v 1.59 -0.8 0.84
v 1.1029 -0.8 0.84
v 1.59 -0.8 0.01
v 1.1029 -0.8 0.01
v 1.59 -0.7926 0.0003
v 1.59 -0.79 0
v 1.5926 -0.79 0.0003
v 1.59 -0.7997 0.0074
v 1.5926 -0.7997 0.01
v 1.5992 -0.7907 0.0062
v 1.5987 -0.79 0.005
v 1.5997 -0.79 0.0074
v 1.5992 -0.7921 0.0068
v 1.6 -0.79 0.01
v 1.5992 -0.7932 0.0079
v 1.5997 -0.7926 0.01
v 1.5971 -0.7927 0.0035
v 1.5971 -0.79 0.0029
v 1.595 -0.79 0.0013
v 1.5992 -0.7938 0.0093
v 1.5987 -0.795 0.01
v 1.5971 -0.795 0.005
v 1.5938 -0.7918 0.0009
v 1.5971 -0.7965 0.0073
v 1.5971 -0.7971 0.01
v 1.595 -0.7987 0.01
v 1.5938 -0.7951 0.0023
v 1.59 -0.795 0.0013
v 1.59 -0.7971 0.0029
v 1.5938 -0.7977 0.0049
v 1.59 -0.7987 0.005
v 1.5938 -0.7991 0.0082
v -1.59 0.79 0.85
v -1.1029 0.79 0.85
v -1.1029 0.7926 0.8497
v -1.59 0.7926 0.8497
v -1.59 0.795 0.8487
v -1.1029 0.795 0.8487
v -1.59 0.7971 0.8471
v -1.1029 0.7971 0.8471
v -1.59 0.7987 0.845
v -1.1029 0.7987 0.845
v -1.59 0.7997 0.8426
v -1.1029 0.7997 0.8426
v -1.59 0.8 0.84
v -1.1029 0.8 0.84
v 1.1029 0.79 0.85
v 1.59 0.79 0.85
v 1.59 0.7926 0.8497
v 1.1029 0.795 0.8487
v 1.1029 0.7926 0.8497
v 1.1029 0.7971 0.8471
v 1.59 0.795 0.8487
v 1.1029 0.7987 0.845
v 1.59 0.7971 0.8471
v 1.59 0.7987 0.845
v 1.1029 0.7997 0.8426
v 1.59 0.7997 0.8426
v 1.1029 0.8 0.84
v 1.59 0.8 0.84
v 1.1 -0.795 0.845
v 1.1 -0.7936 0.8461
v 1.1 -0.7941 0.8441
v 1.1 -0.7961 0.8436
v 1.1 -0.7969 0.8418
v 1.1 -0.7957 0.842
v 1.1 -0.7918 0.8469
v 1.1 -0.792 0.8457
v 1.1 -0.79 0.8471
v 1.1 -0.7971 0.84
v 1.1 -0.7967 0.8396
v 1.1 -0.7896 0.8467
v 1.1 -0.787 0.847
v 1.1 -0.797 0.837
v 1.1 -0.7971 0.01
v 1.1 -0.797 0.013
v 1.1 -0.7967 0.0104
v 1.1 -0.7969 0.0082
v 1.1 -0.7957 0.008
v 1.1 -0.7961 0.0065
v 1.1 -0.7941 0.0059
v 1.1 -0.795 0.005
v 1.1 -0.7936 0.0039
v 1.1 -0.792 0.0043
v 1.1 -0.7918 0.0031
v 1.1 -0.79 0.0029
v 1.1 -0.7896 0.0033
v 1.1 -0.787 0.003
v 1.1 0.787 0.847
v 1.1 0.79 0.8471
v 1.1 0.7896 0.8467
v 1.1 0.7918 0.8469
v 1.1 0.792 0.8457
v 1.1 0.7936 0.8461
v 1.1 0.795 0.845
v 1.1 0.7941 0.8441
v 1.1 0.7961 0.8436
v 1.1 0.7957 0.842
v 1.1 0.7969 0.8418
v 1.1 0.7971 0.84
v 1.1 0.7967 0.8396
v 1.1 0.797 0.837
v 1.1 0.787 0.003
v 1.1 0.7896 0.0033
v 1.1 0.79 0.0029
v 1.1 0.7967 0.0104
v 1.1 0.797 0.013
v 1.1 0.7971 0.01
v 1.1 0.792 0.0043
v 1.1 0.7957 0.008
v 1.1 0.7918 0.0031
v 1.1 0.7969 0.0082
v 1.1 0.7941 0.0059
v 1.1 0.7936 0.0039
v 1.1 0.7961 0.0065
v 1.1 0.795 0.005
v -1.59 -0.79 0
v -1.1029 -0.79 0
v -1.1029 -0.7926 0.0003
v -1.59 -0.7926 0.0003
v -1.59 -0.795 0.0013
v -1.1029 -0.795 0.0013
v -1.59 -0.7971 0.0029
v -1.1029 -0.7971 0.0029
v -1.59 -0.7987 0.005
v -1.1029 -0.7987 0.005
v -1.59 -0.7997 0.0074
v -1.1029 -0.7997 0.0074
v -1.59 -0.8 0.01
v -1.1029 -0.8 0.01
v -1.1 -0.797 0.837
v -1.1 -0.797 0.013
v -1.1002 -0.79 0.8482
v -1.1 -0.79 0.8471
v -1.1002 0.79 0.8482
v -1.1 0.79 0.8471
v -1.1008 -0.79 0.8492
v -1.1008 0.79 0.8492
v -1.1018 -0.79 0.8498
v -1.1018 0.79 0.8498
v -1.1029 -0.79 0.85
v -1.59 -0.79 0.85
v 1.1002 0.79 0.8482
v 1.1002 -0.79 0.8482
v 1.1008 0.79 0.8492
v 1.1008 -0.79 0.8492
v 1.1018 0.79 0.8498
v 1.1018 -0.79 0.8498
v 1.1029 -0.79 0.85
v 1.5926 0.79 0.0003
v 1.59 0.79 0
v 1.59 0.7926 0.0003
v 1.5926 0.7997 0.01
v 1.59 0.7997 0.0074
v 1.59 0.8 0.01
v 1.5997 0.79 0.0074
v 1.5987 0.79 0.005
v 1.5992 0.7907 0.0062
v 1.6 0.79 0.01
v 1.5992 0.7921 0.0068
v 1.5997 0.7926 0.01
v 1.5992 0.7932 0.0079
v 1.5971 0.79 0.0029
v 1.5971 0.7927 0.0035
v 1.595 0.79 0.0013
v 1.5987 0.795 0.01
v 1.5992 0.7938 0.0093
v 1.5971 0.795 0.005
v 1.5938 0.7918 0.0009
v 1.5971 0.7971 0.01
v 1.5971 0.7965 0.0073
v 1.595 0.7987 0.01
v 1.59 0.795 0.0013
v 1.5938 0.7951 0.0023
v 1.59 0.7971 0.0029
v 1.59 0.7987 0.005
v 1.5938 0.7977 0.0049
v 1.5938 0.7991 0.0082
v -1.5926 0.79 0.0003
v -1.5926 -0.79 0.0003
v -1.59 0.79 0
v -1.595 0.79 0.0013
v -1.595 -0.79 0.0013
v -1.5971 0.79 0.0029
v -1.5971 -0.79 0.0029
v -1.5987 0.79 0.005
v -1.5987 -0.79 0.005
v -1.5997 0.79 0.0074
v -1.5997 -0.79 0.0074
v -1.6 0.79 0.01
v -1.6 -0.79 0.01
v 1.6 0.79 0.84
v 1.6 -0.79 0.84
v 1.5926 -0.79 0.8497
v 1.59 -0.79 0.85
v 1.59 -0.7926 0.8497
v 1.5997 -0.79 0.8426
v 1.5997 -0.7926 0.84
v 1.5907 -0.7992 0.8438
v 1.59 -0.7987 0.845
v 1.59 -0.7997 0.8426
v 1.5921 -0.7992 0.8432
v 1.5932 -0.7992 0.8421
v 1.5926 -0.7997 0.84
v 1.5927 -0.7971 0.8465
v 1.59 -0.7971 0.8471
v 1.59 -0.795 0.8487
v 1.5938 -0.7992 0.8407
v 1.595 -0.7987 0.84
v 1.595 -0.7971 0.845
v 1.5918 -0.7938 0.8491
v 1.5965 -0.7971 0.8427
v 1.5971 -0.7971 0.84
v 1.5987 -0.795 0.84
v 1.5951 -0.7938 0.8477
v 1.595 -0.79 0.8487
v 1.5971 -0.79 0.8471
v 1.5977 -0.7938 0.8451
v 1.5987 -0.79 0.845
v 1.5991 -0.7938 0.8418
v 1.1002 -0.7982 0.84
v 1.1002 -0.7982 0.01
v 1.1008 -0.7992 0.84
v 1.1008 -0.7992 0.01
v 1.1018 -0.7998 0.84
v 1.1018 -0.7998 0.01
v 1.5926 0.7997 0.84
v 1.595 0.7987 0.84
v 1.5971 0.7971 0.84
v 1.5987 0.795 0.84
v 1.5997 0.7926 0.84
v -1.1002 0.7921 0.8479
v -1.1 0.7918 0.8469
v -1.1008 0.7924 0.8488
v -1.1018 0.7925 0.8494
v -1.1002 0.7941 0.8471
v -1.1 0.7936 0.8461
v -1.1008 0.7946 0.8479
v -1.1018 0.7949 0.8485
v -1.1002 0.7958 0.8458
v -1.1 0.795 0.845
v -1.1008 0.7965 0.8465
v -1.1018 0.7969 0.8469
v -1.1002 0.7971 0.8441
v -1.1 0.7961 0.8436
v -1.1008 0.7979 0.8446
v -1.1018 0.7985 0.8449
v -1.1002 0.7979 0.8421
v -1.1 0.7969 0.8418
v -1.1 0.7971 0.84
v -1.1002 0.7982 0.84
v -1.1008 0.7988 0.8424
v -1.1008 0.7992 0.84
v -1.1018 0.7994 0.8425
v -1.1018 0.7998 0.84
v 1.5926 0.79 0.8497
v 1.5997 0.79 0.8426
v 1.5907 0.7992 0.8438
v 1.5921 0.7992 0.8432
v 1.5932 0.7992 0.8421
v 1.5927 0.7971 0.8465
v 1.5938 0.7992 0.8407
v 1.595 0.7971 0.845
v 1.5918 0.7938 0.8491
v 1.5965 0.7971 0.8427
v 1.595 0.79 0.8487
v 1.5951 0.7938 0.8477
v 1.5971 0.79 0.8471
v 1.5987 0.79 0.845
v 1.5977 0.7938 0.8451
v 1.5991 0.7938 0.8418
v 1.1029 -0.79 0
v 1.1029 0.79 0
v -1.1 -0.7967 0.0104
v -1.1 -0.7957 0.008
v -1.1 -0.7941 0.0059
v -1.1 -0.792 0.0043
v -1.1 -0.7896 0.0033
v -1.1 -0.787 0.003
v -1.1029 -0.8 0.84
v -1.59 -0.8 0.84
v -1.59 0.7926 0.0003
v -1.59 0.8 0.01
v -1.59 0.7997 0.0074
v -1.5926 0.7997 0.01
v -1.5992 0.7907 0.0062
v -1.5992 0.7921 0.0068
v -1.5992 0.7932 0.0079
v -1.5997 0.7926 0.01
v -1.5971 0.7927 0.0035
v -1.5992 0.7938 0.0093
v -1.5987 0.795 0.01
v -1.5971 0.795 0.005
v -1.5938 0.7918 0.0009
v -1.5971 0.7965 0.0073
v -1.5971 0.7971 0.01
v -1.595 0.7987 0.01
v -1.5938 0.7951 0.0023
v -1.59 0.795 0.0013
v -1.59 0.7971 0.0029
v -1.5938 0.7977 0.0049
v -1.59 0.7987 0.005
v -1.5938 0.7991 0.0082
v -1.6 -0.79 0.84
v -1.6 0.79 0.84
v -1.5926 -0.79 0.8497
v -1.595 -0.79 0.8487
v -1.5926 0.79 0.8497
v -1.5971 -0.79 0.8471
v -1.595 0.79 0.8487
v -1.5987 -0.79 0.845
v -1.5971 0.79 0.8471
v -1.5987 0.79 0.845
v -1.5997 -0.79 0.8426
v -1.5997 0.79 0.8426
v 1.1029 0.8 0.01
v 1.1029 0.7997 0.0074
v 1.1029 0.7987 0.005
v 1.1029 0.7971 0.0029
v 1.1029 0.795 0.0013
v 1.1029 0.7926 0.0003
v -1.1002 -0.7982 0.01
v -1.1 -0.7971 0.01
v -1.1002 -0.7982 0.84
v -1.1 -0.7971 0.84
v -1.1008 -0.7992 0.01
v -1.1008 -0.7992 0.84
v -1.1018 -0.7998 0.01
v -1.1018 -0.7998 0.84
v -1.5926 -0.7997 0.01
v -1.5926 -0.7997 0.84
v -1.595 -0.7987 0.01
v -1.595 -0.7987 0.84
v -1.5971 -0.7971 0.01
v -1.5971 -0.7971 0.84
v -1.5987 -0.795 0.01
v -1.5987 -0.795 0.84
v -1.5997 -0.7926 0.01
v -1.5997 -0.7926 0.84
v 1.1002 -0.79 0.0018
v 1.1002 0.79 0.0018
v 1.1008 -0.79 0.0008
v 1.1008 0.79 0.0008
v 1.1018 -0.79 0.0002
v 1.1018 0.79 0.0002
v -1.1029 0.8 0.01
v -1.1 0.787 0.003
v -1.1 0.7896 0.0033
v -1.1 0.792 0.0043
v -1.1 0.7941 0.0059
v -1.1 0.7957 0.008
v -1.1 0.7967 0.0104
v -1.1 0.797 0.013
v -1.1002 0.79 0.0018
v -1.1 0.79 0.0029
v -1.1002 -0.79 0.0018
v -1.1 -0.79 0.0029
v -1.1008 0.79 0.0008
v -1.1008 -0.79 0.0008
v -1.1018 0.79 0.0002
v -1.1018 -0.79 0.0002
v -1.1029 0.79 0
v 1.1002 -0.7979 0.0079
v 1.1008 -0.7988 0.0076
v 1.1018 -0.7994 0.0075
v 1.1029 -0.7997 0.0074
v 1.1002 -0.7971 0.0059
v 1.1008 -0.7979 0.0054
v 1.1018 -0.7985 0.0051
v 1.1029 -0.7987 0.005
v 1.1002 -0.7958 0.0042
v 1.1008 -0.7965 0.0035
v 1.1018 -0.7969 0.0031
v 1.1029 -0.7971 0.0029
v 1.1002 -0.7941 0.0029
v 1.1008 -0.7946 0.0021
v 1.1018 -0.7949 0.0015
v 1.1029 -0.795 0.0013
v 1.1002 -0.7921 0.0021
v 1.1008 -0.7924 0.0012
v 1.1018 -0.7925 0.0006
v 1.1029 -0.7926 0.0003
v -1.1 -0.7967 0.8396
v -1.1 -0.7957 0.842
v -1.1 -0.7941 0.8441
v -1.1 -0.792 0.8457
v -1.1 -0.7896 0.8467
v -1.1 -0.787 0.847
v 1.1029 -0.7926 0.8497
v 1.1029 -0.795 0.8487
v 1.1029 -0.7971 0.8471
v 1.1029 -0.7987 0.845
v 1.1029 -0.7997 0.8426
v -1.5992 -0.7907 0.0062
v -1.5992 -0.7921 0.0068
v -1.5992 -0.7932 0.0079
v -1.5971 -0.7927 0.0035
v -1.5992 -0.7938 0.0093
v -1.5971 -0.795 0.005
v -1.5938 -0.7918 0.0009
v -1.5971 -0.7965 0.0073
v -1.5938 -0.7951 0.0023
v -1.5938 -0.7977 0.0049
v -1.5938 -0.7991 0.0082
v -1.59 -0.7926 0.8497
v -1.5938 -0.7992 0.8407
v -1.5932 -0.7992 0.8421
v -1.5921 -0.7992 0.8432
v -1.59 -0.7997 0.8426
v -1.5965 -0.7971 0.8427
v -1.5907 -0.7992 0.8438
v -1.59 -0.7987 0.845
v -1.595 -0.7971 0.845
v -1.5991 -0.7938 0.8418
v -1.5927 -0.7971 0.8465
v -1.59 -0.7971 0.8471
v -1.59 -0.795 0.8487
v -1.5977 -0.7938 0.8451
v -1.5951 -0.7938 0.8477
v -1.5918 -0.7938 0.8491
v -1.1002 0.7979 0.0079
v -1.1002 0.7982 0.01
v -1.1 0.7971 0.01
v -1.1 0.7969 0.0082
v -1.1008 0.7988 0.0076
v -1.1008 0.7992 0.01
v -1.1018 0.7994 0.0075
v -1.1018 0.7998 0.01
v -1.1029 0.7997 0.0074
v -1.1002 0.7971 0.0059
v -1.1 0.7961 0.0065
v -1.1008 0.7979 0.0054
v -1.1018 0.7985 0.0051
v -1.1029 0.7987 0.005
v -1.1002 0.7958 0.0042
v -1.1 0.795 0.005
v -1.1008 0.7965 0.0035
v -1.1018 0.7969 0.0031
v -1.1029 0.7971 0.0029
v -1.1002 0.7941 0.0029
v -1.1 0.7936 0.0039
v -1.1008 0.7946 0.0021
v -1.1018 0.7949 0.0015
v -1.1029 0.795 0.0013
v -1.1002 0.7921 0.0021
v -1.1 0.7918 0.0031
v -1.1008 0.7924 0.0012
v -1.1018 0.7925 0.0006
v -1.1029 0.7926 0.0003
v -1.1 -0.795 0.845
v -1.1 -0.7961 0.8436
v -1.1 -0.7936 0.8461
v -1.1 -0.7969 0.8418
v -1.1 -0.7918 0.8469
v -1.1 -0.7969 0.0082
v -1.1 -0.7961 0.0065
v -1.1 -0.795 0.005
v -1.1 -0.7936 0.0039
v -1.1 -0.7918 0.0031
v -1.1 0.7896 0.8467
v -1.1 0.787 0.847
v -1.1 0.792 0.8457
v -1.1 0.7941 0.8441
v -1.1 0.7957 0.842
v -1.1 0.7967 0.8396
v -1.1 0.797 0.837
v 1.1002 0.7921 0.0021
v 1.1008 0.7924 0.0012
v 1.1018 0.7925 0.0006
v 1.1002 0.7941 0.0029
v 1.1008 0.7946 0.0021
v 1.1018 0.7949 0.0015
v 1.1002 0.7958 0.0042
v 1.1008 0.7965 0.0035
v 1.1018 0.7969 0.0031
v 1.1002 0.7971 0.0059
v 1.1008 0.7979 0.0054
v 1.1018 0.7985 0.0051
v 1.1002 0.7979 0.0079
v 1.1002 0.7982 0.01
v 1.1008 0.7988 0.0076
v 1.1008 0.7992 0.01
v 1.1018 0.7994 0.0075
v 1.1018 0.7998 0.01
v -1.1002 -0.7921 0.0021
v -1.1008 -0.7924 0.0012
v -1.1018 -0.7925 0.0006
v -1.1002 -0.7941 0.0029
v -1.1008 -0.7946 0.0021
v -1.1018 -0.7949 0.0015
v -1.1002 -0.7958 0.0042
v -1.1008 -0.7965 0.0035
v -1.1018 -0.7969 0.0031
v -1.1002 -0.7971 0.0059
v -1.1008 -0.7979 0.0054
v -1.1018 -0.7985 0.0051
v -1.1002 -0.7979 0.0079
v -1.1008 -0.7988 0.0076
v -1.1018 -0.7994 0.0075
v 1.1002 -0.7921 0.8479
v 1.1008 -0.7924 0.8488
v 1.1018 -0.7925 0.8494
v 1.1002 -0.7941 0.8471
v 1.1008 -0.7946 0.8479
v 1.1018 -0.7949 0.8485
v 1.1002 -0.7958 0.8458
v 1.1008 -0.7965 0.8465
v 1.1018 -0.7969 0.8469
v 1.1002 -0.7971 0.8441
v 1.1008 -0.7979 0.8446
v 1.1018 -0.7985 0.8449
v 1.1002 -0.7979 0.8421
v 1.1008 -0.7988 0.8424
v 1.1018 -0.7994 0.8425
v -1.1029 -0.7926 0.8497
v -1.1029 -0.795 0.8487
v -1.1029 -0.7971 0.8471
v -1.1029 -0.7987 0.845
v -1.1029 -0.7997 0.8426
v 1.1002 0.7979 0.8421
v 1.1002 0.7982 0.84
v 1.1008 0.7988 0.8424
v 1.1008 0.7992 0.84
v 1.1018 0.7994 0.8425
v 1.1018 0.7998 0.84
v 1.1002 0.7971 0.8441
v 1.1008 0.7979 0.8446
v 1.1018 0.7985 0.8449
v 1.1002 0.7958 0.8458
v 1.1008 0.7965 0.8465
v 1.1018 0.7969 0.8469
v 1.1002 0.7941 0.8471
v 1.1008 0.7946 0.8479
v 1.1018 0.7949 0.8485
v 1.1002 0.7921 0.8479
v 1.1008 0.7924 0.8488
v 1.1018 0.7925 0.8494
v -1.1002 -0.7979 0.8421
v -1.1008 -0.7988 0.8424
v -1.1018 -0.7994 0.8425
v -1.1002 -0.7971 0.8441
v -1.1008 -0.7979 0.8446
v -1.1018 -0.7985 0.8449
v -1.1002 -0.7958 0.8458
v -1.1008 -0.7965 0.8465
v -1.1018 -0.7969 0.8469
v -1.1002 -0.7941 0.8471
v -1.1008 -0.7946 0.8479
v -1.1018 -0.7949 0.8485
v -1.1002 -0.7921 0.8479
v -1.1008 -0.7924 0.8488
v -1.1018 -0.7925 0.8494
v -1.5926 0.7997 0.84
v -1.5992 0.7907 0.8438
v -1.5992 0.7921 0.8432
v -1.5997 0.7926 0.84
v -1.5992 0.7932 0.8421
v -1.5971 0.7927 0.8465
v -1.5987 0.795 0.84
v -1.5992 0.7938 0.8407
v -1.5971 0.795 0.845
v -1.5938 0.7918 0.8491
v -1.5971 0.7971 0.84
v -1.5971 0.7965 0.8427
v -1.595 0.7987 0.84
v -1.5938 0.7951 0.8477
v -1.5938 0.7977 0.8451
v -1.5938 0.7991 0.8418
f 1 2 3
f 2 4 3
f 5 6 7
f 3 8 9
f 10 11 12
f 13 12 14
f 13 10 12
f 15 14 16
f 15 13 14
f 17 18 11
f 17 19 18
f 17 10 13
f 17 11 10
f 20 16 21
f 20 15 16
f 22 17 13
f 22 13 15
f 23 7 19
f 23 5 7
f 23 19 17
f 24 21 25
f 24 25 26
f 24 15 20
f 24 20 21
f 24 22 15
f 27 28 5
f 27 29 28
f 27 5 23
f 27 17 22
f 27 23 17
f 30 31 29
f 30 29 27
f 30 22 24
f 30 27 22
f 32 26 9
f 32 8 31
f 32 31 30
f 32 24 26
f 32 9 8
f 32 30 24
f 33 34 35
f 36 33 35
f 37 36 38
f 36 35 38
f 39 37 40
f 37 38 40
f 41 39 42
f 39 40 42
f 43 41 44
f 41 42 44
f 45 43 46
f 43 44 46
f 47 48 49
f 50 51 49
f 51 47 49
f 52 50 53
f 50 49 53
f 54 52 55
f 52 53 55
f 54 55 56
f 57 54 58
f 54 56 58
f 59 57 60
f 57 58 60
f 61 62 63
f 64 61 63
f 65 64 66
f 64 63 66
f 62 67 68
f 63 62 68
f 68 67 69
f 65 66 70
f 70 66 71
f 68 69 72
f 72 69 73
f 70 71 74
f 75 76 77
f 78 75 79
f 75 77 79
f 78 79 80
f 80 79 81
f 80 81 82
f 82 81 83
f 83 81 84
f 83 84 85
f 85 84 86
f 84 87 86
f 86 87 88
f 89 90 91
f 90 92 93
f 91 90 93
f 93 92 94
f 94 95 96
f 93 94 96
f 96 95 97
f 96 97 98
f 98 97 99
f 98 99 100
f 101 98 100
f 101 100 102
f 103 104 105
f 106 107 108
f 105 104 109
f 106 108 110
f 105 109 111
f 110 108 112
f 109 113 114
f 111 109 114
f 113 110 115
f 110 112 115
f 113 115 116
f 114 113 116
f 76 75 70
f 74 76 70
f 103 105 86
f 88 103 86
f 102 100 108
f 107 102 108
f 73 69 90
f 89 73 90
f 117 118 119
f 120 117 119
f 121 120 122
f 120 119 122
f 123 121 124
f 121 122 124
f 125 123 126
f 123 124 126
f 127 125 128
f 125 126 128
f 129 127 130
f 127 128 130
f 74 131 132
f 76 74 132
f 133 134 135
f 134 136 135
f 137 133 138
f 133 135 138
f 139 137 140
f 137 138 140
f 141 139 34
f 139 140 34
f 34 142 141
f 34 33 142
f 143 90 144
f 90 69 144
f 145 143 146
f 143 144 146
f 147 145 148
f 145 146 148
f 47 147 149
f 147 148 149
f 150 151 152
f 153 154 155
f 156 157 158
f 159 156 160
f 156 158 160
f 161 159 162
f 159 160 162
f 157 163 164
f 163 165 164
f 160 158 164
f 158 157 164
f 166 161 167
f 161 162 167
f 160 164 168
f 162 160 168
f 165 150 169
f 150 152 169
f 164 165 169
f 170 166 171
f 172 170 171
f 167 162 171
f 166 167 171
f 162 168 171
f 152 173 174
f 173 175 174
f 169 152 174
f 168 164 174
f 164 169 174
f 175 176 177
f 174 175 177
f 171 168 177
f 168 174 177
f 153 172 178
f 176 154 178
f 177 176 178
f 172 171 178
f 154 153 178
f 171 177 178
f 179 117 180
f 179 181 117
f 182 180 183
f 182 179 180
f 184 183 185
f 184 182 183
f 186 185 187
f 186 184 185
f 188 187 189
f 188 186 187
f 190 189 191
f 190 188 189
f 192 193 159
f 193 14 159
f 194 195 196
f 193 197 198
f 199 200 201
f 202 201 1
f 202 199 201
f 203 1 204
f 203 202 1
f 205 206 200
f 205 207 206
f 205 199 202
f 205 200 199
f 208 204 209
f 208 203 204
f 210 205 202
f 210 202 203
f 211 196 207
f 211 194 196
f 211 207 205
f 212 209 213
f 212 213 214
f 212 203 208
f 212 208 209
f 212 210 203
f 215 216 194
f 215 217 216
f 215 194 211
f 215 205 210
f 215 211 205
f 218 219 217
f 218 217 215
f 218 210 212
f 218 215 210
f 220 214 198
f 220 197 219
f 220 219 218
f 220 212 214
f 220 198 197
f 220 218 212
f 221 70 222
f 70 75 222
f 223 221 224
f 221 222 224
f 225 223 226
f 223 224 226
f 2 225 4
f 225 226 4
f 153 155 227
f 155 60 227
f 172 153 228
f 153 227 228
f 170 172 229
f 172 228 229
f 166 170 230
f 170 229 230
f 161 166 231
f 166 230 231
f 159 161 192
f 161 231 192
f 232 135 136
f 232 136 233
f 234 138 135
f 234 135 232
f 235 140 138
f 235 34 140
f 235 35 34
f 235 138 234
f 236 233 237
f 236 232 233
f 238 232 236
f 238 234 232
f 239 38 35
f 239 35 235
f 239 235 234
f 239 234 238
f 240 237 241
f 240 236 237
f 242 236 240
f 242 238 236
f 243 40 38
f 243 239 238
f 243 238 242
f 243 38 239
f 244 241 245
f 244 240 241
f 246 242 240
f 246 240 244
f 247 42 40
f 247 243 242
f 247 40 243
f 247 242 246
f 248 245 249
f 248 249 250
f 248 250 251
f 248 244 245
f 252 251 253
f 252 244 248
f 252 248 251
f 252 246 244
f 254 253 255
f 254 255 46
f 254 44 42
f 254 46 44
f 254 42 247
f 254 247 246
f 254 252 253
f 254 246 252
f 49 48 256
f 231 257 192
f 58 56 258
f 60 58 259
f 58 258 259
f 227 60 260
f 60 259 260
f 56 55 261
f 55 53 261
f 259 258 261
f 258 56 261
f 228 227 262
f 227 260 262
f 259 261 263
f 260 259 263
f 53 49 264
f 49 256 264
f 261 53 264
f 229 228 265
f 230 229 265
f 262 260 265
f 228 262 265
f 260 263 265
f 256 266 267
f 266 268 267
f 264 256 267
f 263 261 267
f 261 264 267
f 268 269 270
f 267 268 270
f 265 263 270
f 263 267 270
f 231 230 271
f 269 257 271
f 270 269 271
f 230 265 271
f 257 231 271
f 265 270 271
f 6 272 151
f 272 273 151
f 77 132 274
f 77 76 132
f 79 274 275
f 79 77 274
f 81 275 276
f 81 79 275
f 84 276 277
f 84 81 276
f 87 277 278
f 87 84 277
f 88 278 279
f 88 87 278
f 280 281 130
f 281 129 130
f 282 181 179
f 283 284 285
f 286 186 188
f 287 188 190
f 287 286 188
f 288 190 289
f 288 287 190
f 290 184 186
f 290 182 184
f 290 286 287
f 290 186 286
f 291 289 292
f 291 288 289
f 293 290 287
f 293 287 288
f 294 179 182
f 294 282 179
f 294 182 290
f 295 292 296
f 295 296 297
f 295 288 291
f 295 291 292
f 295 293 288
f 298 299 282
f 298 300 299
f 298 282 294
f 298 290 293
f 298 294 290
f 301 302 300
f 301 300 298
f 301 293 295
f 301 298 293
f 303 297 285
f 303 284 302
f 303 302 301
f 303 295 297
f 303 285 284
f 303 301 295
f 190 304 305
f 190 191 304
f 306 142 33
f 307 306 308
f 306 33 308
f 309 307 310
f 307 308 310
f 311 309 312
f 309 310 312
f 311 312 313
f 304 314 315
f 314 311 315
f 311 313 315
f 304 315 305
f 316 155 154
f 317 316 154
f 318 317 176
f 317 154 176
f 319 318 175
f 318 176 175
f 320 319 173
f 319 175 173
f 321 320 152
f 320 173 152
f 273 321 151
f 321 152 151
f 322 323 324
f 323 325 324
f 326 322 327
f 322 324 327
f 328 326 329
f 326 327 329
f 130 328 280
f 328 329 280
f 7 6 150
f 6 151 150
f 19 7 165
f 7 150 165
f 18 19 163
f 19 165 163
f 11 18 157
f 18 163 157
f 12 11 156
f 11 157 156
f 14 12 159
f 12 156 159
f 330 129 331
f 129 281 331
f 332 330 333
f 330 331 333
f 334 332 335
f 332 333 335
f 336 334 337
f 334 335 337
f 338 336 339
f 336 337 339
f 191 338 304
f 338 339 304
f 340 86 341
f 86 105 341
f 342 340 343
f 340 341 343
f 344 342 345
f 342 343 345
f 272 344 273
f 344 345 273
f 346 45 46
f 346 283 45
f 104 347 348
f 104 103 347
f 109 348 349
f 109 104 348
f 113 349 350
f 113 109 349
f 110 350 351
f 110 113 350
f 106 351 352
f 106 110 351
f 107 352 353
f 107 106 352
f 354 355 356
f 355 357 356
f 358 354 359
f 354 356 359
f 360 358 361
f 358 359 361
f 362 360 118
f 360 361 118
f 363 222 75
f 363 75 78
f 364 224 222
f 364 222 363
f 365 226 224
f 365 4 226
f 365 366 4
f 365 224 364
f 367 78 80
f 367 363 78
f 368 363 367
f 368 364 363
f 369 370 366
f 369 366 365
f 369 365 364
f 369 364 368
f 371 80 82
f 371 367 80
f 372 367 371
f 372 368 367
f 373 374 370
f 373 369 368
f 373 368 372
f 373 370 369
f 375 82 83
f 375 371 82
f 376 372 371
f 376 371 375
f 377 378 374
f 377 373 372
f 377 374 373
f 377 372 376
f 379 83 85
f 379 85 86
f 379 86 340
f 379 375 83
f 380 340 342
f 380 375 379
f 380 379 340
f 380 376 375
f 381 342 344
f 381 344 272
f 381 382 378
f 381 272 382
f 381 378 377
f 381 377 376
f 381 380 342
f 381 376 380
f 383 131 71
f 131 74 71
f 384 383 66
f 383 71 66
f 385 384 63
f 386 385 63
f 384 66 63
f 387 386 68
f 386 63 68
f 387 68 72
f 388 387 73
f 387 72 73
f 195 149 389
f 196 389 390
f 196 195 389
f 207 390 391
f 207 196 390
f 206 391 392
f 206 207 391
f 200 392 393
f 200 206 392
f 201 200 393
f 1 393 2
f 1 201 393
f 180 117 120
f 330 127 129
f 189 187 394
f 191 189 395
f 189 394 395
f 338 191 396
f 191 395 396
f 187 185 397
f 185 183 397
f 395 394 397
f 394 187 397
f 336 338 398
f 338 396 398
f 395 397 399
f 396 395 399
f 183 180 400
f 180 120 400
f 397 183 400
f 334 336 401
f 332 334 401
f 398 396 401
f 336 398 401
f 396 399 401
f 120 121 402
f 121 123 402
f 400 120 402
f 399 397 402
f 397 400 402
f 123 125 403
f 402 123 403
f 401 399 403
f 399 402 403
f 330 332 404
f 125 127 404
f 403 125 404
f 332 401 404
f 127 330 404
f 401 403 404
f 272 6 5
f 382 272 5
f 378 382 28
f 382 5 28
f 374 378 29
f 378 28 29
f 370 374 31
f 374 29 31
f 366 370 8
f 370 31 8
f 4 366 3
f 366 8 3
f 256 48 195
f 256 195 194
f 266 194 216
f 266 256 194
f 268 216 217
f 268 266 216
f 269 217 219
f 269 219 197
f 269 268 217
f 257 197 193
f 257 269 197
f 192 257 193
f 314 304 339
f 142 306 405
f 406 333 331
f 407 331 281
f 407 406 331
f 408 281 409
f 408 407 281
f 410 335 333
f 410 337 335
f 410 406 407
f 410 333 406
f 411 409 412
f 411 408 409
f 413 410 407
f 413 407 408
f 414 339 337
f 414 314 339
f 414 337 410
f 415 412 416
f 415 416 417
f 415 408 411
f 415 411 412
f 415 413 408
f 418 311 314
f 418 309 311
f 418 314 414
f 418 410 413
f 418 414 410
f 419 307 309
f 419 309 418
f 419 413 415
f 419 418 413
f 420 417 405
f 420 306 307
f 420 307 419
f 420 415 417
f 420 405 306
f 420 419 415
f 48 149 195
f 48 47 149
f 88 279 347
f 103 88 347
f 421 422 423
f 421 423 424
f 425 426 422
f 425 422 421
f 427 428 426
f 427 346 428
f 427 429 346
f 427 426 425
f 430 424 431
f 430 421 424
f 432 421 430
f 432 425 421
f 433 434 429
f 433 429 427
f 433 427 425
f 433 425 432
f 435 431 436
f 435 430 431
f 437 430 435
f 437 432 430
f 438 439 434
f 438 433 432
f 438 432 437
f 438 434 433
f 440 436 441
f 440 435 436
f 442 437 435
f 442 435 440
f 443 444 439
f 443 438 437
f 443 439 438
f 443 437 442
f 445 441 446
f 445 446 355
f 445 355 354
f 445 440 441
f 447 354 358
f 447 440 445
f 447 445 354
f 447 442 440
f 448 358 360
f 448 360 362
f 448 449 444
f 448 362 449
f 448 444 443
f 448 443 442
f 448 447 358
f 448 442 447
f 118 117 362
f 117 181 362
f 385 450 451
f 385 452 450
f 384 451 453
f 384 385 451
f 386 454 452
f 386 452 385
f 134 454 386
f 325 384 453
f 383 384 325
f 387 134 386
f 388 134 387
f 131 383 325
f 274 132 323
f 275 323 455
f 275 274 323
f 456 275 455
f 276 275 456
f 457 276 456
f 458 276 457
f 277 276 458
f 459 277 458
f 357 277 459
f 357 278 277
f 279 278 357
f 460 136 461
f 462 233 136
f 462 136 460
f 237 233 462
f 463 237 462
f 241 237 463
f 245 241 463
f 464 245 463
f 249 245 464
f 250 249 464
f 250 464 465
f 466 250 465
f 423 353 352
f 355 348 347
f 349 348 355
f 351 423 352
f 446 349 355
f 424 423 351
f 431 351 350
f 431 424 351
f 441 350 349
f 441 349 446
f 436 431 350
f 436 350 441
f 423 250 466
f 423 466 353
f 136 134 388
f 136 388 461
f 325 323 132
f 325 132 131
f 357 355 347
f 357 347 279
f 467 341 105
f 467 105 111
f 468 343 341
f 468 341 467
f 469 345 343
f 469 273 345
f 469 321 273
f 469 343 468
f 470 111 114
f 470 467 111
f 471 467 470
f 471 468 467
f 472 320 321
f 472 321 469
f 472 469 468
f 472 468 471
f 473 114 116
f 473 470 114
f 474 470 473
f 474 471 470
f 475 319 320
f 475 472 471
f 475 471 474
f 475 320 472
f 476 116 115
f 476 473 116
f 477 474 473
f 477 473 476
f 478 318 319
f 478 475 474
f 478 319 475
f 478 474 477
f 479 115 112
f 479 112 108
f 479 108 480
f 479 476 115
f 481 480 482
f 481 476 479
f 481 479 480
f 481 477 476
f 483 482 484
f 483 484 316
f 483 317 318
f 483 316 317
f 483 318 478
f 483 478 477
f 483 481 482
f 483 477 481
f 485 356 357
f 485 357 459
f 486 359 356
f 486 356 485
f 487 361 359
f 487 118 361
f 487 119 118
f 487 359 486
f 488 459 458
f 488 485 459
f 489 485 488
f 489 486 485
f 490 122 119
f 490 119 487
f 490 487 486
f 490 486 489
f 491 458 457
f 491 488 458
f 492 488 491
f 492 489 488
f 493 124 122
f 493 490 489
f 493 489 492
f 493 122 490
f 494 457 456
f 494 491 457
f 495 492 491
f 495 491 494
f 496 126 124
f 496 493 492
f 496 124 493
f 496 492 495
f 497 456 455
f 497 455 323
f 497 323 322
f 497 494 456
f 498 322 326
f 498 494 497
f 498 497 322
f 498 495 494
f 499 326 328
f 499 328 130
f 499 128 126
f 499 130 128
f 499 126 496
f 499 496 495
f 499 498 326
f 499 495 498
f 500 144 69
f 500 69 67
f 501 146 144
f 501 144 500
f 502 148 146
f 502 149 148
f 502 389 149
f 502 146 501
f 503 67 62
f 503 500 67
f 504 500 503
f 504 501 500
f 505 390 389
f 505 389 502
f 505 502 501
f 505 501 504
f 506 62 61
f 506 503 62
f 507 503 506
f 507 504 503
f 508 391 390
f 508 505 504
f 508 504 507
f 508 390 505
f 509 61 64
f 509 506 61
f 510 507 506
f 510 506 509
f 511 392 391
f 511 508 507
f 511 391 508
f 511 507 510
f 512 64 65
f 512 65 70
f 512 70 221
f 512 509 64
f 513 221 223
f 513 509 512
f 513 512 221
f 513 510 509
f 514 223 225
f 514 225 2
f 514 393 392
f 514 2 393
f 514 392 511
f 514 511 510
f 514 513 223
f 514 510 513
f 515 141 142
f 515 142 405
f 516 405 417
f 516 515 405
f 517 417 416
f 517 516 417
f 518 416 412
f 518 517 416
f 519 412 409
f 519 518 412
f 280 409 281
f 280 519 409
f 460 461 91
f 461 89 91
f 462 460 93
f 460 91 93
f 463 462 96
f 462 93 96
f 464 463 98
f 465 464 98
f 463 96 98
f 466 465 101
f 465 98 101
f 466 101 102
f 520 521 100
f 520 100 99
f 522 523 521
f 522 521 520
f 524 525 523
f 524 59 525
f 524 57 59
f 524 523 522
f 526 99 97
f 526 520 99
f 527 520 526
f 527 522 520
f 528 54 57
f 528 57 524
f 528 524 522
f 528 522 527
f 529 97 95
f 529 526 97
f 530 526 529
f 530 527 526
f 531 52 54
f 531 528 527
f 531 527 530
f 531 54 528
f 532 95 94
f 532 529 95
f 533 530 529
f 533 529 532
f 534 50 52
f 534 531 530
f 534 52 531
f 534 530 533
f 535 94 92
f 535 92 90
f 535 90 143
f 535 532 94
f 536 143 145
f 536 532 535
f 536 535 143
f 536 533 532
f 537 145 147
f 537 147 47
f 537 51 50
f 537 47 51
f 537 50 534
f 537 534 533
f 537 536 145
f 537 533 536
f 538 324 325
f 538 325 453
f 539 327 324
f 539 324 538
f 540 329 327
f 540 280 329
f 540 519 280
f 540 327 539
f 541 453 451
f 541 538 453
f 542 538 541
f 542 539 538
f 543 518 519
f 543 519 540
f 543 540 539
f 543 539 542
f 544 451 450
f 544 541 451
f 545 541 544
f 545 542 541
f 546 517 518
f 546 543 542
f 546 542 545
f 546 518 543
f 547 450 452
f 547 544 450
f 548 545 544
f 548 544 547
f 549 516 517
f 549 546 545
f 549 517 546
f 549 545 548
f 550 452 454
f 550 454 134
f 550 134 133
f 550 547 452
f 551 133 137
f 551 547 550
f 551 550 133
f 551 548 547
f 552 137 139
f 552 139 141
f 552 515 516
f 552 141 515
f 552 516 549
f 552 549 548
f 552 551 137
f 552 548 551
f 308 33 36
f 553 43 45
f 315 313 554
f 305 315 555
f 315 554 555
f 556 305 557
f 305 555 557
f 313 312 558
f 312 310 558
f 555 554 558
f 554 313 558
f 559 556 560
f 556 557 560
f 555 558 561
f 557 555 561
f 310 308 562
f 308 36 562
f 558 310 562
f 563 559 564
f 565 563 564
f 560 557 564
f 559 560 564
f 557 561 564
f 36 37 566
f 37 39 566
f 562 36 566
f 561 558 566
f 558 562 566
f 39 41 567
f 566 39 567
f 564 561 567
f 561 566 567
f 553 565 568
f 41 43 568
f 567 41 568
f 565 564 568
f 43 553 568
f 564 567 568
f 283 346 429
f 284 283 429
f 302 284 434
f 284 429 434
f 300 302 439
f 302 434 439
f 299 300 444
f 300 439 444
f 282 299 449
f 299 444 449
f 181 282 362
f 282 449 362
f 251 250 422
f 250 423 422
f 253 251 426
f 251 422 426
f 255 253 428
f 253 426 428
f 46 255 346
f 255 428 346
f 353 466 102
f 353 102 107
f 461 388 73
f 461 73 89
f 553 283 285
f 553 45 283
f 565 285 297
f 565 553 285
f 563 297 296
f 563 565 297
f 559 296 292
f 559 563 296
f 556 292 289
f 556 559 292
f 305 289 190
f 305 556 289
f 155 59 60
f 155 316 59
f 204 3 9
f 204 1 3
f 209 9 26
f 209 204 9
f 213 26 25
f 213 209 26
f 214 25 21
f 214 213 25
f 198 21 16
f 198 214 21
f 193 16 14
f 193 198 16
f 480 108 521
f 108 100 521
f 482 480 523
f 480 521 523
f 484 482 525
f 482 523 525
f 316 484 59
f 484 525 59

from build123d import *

# Parameters (mm, degrees)
SKETCH1_W                           = 3.2
SKETCH1_H                           = 1.6
ALL_BODY_DEPTH                      = 0.85
CUT_OUT_THE_BODY_FOR_PIN_DEPTH      = 1.1
CUT_OUT_THE_BODY_FOR_PIN_DEPTH_BACK = 1.1
SKETCH2_OUTSIDE_W                   = 3.586
SKETCH2_OUTSIDE_H                   = 4.336
SKETCH2_OUTSIDE_W_2                 = 0.844
SKETCH2_OUTSIDE_H_2                 = 1.594
BODY_FILLET_R                       = 0.01
PIN_FILLET_A_R                      = 0.01
PIN_FILLET_B_R                      = 0.003


with BuildPart() as part:
    # Sketch1 → All body (new body)
    with BuildSketch(Plane.XY):
        Rectangle(SKETCH1_W, SKETCH1_H)
    extrude(amount=ALL_BODY_DEPTH)

    # Sketch2 outside → Cut out the body for pin (cut, two sides: drawn at the far end of the back side and taken through both)
    with BuildSketch(Plane(origin=(0, 0, 0), x_dir=(0, 0, -1), z_dir=(1, 0, 0)).offset(-CUT_OUT_THE_BODY_FOR_PIN_DEPTH_BACK)):
        with Locations((-0.425, 0)):
            Rectangle(SKETCH2_OUTSIDE_W, SKETCH2_OUTSIDE_H)
        with Locations((-0.425, 0)):
            Rectangle(SKETCH2_OUTSIDE_W_2, SKETCH2_OUTSIDE_H_2, mode=Mode.SUBTRACT)
    extrude(amount=CUT_OUT_THE_BODY_FOR_PIN_DEPTH + CUT_OUT_THE_BODY_FOR_PIN_DEPTH_BACK, mode=Mode.SUBTRACT)

    # Body fillet
    body_fillet_edges = [part.edges().sort_by_distance(p)[0] for p in [
        (0, 0.797, 0.003),
        (0, 0.797, 0.847),
        (0, -0.797, 0.847),
        (0, -0.797, 0.003),
    ]]
    fillet(body_fillet_edges, radius=BODY_FILLET_R)

    # Pin fillet a
    pin_fillet_a_edges = [part.edges().sort_by_distance(p)[0] for p in [
        (1.6, 0, 0.85),
        (-1.35, 0.8, 0),
        (1.35, -0.8, 0),
        (1.35, -0.8, 0.85),
        (-1.35, 0.8, 0.85),
        (1.35, 0.8, 0.85),
        (-1.6, 0, 0.85),
        (1.35, 0.8, 0),
        (1.6, 0, 0),
        (-1.35, -0.8, 0),
        (-1.6, 0, 0),
        (-1.6, 0.8, 0.425),
        (1.6, 0.8, 0.425),
        (1.6, -0.8, 0.425),
        (-1.6, -0.8, 0.425),
        (-1.35, -0.8, 0.85),
    ]]
    fillet(pin_fillet_a_edges, radius=PIN_FILLET_A_R)

    # Pin fillet b
    pin_fillet_b_edges = [part.edges().sort_by_distance(p)[0] for p in [
        (1.1, -0.8, 0.425),
        (1.1, 0, 0.85),
        (1.1, 0.8, 0.425),
        (1.1, 0, 0),
        (-1.1, 0.8, 0.425),
        (-1.1, 0, 0.85),
        (-1.1, -0.8, 0.425),
        (-1.1, 0, 0),
        (1.1, 0.797071068, 0.002928932),
        (1.1, -0.797071068, 0.002928932),
        (1.1, -0.797071068, 0.847071068),
        (1.1, 0.797071068, 0.847071068),
        (-1.1, -0.797071068, 0.847071068),
        (-1.1, 0.797071068, 0.847071068),
        (-1.1, -0.797071068, 0.002928932),
        (-1.1, 0.797071068, 0.002928932),
    ]]
    fillet(pin_fillet_b_edges, radius=PIN_FILLET_B_R - 0.0001)  # a hair under: the kernel refuses the full size


solid = part.part
